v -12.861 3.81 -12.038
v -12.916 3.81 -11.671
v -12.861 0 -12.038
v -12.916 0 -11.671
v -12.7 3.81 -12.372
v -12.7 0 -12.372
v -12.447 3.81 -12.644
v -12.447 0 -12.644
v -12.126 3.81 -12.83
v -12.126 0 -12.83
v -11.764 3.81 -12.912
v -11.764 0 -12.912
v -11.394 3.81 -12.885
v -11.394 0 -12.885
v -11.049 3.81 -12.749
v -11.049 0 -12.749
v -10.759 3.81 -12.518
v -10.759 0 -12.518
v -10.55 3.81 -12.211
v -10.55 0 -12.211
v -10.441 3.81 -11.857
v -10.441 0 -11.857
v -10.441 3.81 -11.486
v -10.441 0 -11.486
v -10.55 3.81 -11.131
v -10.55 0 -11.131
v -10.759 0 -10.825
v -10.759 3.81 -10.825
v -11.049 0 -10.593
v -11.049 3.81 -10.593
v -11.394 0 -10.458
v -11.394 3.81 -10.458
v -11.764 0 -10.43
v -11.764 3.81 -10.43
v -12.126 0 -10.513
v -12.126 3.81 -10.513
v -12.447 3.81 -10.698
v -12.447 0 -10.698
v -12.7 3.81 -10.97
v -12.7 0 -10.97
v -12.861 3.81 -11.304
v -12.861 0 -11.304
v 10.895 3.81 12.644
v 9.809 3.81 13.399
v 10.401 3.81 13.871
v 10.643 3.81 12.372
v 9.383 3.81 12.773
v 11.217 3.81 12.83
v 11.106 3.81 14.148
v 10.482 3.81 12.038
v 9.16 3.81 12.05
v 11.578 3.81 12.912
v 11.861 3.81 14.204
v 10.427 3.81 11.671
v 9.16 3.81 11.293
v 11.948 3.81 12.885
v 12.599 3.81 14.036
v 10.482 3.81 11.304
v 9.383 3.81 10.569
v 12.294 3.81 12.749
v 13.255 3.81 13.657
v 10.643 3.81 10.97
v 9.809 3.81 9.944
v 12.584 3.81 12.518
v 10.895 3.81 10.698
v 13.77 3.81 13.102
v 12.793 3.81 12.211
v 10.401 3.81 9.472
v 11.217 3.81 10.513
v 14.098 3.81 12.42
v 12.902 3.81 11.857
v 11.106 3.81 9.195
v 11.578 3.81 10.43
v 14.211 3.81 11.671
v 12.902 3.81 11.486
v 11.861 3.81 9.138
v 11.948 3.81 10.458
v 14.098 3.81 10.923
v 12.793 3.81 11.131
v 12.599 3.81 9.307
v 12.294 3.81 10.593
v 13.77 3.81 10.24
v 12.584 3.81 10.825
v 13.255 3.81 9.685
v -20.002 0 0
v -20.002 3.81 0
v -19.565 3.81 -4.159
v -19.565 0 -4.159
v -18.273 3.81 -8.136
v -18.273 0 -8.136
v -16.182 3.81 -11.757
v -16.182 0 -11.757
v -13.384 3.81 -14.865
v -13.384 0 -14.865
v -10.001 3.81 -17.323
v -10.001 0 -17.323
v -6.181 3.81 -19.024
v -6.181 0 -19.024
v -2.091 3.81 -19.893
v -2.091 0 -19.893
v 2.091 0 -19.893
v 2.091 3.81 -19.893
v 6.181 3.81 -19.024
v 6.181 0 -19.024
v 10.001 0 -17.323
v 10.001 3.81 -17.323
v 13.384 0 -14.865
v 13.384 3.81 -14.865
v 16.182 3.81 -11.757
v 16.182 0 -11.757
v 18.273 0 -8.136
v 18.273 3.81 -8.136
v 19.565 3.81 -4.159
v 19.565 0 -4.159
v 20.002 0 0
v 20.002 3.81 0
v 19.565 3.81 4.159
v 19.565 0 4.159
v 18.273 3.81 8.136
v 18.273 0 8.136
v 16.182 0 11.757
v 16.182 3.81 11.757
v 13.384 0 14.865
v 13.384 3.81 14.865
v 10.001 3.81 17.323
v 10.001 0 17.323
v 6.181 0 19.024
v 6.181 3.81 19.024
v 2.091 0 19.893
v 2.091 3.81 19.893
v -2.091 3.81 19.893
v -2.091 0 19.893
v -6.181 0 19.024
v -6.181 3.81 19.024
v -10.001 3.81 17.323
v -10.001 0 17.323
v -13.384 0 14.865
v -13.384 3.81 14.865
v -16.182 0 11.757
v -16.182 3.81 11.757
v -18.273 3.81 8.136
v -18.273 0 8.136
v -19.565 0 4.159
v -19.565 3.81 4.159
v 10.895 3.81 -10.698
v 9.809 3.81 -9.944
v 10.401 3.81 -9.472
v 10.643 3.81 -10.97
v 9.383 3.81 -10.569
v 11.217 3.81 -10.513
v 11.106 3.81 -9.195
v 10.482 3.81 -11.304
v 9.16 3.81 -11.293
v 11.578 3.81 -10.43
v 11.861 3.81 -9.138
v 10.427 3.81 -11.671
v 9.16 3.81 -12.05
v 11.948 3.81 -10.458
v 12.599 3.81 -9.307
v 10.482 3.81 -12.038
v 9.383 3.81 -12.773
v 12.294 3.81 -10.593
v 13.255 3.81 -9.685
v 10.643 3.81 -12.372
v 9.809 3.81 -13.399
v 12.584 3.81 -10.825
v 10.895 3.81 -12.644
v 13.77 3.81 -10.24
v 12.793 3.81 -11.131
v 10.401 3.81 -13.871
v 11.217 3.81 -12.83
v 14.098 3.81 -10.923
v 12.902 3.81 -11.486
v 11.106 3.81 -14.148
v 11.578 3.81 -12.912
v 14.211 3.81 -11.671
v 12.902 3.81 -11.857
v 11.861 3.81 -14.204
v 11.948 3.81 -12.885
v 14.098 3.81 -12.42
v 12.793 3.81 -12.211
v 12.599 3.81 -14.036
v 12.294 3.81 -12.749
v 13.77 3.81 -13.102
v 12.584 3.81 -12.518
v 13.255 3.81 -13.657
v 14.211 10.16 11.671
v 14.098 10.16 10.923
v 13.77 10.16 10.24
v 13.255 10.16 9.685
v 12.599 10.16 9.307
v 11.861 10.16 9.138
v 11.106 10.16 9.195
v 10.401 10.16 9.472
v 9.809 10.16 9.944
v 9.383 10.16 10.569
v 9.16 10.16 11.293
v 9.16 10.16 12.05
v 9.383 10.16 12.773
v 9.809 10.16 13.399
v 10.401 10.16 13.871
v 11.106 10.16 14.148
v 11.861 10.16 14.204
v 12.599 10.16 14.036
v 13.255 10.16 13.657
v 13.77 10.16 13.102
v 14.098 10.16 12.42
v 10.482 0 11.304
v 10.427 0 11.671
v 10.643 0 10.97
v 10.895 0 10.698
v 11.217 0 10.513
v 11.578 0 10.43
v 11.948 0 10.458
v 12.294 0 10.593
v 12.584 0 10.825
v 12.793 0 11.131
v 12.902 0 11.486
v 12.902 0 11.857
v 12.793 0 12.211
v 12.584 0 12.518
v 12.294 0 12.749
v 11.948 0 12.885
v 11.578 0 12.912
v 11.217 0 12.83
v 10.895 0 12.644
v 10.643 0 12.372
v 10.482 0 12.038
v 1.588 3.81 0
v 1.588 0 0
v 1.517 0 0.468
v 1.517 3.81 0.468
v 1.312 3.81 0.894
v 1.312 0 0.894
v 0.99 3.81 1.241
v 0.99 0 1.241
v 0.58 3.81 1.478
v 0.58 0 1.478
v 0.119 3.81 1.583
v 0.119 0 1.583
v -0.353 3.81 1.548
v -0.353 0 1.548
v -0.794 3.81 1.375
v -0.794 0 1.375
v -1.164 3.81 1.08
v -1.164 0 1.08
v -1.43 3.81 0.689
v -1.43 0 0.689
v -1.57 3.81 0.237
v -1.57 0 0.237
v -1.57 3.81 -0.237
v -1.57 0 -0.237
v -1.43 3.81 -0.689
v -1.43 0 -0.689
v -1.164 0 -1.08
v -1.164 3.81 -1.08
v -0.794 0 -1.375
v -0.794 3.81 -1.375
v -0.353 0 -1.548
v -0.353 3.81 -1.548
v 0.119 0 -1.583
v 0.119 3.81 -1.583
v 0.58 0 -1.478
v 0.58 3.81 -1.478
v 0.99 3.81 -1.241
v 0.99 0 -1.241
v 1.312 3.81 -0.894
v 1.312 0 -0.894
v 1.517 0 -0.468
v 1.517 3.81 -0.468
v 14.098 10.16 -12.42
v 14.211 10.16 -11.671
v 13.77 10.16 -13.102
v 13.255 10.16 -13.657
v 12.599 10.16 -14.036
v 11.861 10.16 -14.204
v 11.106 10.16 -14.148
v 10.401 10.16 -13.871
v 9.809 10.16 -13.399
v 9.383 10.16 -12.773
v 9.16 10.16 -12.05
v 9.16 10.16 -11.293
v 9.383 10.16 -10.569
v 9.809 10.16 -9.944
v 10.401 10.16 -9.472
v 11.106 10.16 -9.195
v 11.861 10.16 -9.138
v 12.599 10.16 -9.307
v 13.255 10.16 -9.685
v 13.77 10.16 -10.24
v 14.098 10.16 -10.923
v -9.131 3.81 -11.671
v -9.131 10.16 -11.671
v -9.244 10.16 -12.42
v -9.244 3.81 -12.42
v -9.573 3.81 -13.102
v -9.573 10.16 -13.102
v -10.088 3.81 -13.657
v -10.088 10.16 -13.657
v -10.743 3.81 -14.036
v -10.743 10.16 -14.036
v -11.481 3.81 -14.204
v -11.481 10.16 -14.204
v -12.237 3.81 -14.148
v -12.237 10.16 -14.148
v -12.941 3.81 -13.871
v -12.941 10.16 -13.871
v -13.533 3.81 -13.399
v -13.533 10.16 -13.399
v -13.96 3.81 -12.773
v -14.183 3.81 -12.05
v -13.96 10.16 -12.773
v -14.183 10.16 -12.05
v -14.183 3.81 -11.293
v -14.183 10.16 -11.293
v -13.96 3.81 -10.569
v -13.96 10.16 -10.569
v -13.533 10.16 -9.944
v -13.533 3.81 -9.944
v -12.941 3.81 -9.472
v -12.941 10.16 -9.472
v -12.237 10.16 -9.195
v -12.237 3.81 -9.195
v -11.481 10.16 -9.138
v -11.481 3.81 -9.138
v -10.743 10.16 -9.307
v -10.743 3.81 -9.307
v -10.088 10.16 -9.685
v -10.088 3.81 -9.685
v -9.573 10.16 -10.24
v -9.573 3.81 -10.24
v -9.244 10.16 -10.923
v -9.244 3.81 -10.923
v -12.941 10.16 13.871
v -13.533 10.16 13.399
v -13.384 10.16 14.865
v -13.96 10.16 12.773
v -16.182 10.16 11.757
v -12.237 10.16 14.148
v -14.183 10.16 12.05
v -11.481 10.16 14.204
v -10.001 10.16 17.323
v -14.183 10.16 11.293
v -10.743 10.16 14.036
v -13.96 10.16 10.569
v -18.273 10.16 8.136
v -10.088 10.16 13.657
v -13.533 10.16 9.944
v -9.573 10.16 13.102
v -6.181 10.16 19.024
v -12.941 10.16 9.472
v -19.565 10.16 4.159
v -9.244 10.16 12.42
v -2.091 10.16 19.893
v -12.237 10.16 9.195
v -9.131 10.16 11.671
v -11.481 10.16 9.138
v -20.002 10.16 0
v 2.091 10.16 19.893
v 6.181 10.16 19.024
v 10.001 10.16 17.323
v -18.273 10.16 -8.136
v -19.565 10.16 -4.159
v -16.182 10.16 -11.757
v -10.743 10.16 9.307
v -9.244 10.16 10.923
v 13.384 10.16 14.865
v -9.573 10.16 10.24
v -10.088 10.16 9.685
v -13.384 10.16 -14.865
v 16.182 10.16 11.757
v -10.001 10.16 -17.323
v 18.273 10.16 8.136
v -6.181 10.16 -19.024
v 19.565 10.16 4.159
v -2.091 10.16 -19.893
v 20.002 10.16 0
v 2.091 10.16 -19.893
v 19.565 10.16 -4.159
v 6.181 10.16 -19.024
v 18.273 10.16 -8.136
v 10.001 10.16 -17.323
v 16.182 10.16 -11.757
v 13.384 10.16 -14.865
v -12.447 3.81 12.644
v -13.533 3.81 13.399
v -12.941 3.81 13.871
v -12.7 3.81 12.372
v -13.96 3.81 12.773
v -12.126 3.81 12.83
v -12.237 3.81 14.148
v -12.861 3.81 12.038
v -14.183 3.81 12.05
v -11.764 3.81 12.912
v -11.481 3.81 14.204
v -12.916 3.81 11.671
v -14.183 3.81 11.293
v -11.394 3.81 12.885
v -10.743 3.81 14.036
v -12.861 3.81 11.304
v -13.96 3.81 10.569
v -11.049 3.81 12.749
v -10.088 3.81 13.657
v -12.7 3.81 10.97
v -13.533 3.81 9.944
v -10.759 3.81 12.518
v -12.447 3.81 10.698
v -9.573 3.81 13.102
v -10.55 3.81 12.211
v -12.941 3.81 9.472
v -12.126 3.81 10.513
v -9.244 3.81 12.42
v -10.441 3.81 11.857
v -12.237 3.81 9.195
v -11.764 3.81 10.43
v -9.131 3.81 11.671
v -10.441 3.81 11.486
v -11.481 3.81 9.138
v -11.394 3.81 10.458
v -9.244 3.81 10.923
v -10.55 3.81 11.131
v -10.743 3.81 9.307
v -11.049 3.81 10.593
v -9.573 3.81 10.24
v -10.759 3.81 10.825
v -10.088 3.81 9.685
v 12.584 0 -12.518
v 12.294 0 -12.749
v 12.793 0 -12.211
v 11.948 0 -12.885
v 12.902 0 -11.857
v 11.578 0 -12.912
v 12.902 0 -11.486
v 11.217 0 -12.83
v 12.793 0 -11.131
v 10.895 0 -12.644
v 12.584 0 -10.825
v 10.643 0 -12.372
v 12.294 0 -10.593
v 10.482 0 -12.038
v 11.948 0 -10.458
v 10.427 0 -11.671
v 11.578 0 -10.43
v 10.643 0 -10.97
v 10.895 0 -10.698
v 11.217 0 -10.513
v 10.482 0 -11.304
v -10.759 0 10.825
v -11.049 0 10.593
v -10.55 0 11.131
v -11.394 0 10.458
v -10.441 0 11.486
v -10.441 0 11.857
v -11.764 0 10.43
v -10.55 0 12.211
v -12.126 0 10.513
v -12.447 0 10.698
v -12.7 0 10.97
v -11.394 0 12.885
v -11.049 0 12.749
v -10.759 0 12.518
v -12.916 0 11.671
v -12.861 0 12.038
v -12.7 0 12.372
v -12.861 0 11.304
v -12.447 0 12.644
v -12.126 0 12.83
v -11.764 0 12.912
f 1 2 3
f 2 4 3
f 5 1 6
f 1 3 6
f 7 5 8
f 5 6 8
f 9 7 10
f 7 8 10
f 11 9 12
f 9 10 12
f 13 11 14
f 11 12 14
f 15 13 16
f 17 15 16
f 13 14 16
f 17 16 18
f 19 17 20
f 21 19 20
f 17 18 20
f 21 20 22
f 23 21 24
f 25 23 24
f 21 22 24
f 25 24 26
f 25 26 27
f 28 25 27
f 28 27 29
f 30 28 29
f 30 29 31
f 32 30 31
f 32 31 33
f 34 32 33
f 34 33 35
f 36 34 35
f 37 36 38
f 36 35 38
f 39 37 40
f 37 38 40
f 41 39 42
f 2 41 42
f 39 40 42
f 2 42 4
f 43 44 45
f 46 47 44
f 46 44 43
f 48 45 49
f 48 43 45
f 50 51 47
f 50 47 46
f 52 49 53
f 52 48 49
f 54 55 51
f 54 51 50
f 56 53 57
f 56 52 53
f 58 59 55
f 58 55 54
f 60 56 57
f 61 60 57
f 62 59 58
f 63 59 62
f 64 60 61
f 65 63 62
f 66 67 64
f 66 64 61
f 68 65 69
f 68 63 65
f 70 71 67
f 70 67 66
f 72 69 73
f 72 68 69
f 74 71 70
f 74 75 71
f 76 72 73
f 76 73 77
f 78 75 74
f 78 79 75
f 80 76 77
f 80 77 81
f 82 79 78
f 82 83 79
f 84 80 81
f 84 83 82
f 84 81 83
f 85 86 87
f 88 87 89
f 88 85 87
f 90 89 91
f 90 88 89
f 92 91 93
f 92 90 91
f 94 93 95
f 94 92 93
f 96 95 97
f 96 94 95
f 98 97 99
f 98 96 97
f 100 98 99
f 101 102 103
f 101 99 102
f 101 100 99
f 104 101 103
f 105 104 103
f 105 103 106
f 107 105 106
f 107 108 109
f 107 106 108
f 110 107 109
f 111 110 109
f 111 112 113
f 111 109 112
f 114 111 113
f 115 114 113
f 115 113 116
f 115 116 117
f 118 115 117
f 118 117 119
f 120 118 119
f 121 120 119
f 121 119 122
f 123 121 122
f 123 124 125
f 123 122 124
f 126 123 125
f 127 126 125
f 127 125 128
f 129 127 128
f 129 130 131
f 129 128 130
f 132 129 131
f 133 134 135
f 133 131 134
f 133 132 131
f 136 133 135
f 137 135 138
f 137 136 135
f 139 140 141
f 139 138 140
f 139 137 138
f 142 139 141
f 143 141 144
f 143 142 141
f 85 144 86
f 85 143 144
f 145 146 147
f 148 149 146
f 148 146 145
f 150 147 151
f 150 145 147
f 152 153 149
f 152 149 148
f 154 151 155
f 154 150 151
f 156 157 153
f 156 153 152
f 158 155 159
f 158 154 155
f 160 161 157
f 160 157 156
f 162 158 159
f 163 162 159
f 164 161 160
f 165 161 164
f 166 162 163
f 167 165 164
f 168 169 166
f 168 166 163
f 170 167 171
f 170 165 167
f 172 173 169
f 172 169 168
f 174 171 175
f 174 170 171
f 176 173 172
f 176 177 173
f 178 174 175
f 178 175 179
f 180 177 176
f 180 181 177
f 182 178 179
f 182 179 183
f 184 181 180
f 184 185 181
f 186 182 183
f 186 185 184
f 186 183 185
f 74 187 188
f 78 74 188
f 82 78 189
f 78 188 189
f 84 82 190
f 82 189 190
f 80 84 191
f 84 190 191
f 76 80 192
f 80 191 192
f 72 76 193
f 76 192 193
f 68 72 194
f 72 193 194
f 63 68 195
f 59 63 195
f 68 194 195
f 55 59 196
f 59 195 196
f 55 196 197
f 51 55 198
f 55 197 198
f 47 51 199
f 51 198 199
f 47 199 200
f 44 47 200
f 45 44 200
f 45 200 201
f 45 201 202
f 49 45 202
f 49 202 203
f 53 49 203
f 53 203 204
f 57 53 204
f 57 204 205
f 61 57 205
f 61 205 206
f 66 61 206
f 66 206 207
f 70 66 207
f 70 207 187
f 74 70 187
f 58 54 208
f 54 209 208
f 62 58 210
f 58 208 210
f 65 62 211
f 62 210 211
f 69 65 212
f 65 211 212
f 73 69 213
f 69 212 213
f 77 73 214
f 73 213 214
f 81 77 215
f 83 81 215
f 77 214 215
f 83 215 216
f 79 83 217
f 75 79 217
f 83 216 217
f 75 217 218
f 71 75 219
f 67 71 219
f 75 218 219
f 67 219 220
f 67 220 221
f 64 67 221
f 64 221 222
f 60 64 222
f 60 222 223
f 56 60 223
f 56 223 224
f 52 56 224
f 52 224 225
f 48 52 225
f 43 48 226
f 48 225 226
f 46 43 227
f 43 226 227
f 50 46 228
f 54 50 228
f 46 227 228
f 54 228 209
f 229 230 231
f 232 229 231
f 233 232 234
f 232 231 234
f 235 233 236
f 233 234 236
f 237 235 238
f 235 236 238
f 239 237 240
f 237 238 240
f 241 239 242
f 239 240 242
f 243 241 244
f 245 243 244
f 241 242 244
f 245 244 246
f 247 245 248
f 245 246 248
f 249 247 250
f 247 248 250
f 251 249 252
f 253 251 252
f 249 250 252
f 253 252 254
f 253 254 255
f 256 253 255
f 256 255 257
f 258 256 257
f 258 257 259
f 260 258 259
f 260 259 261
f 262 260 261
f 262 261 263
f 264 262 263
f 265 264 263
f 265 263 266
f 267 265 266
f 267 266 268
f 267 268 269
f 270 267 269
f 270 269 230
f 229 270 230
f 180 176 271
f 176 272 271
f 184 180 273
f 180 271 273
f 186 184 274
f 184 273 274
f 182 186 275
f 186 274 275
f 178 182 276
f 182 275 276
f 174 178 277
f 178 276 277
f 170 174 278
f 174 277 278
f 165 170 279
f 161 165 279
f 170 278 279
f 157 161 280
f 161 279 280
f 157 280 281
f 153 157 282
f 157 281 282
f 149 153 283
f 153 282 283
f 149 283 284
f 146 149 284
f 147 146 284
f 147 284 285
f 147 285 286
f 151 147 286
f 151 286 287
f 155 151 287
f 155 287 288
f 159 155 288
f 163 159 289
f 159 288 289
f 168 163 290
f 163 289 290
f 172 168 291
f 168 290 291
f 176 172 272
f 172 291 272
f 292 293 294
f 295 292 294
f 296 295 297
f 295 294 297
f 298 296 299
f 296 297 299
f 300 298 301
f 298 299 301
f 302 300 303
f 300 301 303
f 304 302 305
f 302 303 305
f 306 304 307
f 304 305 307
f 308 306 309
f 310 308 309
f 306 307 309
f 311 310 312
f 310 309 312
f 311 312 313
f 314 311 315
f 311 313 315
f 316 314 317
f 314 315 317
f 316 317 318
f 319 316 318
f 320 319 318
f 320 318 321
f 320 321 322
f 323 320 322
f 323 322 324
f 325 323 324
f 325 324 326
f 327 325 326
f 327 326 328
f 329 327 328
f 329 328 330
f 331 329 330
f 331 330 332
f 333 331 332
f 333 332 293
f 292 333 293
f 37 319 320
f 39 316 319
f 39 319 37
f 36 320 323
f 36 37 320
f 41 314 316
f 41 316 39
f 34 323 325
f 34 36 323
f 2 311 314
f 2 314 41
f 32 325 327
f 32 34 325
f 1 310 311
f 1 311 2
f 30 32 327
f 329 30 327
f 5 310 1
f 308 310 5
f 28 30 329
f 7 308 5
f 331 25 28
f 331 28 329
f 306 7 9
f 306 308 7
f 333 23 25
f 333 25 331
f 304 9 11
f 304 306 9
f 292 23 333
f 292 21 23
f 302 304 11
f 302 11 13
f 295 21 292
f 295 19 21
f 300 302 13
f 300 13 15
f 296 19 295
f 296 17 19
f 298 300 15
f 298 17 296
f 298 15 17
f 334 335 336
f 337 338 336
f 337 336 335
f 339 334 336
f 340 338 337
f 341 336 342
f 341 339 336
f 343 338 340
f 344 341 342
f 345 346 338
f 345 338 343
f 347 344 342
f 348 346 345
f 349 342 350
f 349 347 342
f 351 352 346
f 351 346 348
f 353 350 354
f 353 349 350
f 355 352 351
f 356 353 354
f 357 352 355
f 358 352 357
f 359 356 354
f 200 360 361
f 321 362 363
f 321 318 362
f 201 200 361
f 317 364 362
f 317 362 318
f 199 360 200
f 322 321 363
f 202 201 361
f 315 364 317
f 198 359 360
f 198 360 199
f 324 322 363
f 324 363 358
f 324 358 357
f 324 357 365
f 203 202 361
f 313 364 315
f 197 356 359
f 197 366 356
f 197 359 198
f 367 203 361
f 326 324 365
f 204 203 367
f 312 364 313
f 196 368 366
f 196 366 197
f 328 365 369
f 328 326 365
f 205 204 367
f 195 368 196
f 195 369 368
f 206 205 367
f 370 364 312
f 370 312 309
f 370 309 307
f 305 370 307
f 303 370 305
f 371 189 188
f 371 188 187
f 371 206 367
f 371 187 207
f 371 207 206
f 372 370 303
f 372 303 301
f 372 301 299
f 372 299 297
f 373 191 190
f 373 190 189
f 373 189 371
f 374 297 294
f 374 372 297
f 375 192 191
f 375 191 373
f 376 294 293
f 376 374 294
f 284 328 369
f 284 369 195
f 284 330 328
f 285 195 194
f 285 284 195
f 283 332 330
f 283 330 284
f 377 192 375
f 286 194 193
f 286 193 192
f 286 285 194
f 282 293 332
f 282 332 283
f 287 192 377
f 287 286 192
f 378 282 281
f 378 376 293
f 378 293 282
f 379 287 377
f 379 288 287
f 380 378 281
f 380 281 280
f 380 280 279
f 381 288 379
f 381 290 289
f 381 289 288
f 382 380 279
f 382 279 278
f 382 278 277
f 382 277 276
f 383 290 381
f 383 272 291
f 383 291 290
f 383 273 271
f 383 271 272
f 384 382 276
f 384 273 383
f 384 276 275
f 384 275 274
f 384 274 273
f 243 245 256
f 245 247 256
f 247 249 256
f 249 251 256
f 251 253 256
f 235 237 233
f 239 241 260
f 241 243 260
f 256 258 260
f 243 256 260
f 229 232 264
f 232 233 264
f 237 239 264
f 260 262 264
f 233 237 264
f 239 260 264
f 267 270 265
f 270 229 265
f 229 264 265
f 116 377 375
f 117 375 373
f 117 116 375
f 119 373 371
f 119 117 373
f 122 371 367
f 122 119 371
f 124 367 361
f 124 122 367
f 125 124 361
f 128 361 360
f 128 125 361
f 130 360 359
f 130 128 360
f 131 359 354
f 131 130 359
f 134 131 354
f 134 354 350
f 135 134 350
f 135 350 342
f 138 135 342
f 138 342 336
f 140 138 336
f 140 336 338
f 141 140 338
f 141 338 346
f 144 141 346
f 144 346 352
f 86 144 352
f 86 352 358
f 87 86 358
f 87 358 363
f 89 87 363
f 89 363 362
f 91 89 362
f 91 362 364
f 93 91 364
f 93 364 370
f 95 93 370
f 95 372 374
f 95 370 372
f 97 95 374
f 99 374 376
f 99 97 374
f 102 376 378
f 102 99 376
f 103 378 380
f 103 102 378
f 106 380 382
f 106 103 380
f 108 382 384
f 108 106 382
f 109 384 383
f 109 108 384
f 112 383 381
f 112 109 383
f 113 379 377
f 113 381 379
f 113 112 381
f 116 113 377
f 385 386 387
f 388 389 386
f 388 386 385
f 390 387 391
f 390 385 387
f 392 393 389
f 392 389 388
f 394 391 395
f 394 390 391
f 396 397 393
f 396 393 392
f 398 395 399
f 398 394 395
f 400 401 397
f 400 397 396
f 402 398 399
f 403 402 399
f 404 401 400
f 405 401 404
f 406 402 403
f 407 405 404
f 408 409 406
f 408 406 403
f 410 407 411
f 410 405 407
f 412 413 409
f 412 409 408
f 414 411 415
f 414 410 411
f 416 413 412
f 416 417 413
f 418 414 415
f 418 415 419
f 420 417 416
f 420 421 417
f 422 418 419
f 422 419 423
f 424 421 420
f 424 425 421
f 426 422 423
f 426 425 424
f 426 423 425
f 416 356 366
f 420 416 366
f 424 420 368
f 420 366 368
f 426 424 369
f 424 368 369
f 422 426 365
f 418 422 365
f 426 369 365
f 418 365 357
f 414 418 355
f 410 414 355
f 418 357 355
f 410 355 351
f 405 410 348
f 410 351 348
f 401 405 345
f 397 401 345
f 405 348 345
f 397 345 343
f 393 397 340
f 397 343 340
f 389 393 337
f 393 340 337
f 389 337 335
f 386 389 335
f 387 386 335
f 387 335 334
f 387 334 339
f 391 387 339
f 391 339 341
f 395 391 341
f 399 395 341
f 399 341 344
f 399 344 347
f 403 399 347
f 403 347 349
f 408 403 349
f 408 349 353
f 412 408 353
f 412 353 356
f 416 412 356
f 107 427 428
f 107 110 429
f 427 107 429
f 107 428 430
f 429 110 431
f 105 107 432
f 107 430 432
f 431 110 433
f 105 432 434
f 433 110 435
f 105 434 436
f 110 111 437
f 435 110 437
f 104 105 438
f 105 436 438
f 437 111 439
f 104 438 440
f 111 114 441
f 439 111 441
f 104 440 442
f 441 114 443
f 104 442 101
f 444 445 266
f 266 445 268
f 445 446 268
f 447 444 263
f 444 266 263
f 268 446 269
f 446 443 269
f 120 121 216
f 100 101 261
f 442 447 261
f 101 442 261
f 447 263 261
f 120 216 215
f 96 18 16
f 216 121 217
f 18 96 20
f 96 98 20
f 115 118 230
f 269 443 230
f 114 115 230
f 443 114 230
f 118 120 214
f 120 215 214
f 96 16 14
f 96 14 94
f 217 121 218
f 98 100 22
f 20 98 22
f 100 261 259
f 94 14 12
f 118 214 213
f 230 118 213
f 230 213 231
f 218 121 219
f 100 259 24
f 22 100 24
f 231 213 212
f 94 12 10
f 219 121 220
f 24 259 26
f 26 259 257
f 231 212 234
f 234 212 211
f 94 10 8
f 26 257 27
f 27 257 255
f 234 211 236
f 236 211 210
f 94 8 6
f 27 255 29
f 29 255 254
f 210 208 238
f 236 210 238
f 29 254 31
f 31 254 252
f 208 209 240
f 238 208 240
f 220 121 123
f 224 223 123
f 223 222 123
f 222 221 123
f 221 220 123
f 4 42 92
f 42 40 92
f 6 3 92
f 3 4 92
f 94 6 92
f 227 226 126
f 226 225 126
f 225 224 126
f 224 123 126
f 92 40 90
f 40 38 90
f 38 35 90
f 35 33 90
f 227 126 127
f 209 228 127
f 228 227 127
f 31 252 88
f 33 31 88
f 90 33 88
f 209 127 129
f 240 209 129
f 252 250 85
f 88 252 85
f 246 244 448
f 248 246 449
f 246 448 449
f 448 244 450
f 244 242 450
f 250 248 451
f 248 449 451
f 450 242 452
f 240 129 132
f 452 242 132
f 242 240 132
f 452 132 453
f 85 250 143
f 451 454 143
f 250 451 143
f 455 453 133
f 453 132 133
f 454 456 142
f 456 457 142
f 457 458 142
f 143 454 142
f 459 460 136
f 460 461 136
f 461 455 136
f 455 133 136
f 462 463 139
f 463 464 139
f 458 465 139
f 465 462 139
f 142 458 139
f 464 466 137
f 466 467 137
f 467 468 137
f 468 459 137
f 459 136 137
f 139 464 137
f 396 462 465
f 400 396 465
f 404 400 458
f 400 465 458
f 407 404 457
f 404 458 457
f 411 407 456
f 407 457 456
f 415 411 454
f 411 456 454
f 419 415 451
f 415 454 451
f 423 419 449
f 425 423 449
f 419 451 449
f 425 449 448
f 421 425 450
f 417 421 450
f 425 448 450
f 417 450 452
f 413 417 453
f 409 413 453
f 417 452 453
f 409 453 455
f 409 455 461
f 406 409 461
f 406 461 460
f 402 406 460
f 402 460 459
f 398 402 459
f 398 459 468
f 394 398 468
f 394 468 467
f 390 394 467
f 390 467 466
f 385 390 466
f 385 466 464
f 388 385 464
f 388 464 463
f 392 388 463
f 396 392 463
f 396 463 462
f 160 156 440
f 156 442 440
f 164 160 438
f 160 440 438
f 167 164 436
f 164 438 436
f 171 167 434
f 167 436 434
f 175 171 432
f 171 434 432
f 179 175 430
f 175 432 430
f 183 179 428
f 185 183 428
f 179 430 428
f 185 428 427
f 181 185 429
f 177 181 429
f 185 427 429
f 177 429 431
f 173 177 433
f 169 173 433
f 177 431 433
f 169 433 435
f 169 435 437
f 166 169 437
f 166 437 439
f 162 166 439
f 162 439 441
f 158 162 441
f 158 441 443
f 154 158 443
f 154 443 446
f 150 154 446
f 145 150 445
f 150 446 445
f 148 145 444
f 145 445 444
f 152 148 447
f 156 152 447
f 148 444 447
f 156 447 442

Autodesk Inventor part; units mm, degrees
ref_plane "YZ Plane" through (0, 0, 0) normal (1, 0, 0) x (0, 1, 0)
ref_plane "XZ Plane" through (0, 0, 0) normal (0, 1, 0) x (-1, 0, 0)
ref_plane "XY Plane" through (0, 0, 0) normal (0, 0, 1) x (1, 0, 0)
sketch "Sketch1" plane through (0, 0, 0) normal (0, 1, 0) x (-1, 0, 0)
  circle A0 centre (0, 0) radius 20.0025
  line L0 (-11.6713, 11.6713) -> (11.6713, 11.6713)
  line L1 (11.6713, 11.6713) -> (11.6713, -11.6713)
  line L2 (11.6713, -11.6713) -> (-11.6713, -11.6713)
  line L3 (-11.6713, -11.6713) -> (-11.6713, 11.6713)
  line L4 (-11.6713, 11.6713) -> (11.6713, -11.6713) construction
  line L5 (11.6713, 11.6713) -> (-11.6713, -11.6713) construction
  circle A1 centre (11.6713, -11.6713) radius 1.2446
  circle A2 centre (-11.6713, -11.6713) radius 1.2446
  circle A3 centre (-11.6713, 11.6713) radius 1.2446
  circle A4 centre (11.6713, 11.6713) radius 1.2446
  dimension "d0" = 40.005
  dimension "d1" = 23.3426
  dimension "d2" = 23.3426
  dimension "d3" = 2.4892
  dimension "d4" = 2.4892
  dimension "d5" = 2.4892
  dimension "d6" = 2.4892
extrude "Extrusion1" add sketch "Sketch1" along normal blind 3.81 contours A0 | L0 A4 L1 A1 L2 A2 L3 A3
sketch "Sketch3" plane through (0, 0, 0) normal (0, -1, 0) x (1, 0, 0)
  circle A0 centre (0, 0) radius 1.5875
  dimension "d10" = 3.175
extrude "Extrusion2" cut sketch "Sketch3" against normal blind 6.35
sketch "Sketch5" plane through (0, 3.81, 0) normal (0, 1, 0) x (1, 0, 0)
  circle A0 centre (0, 0) radius 20.0025
sketch "Sketch6" plane through (0, 3.81, 0) normal (0, 1, 0) x (1, 0, 0)
  line L0 (-11.6713, 11.6713) -> (11.6713, 11.6713)
  line L1 (11.6713, 11.6713) -> (11.6713, -11.6713)
  line L2 (11.6713, -11.6713) -> (-11.6713, -11.6713)
  line L3 (-11.6713, -11.6713) -> (-11.6713, 11.6713)
  circle A0 centre (0, 0) radius 1.5875 projected
  line L4 (-11.6713, 11.6713) -> (11.6713, -11.6713) construction
  line L5 (11.6713, 11.6713) -> (-11.6713, -11.6713) construction
  circle A1 centre (-11.6713, 11.6713) radius 3.175
  circle A2 centre (11.6713, 11.6713) radius 3.175
  circle A3 centre (11.6713, -11.6713) radius 3.175
  circle A4 centre (-11.6713, -11.6713) radius 1.2446 projected
  circle A5 centre (-11.6713, -11.6713) radius 3.175
  dimension "d13" = 23.3426
  dimension "d14" = 6.35
  dimension "d15" = 6.35
  dimension "d16" = 6.35
  dimension "d17" = 6.35
extrude "Extrusion3" add sketch "Sketch5" along normal blind 6.35
sketch "Sketch7" plane through (0, 10.16, 0) normal (0, 1, 0) x (1, 0, 0)
  line L0 (-11.6713, -11.6713) -> (11.6713, -11.6713)
  line L1 (11.6713, -11.6713) -> (11.6713, 11.6713)
  line L2 (11.6713, 11.6713) -> (-11.6713, 11.6713)
  line L3 (-11.6713, 11.6713) -> (-11.6713, -11.6713)
  circle A0 centre (0, 0) radius 1.5875 projected
  line L4 (-11.6713, -11.6713) -> (11.6713, 11.6713) construction
  line L5 (11.6713, -11.6713) -> (-11.6713, 11.6713) construction
  circle A1 centre (-11.6713, 11.6713) radius 1.2446 projected
  circle A2 centre (-11.6713, 11.6713) radius 2.54
  circle A3 centre (11.6713, 11.6713) radius 1.2446 projected
  circle A4 centre (11.6713, 11.6713) radius 2.54
  circle A5 centre (11.6713, -11.6713) radius 1.2446 projected
  circle A6 centre (11.6713, -11.6713) radius 2.54
  circle A7 centre (-11.6713, -11.6713) radius 1.2446 projected
  circle A8 centre (-11.6713, -11.6713) radius 2.54
  dimension "d20" = 23.3426
  dimension "d21" = 23.3426
  dimension "d22" = 5.08
  dimension "d23" = 5.08
  dimension "d24" = 5.08
  dimension "d25" = 5.08
extrude "Extrusion4" cut sketch "Sketch7" against normal blind 6.35 contours L3 A7 L0 | L0 A7 L3 | A7 L3 A8 L0 | L0 A8 L3 A7 | A6 L1 A5 L0 | L0 A5 L1 A6 | A2 L2 A1 L3 | L3 A1 L2 A2 | A5 L1 L0 | L0 L1 A5 | A1 L2 L3 | L3 L2 A1 | A4 L2 A3 L1 | L1 A3 L2 A4 | A3 L2 L1 | L1 L2 A3
properties part number "CO-0-01-Planetary1"
